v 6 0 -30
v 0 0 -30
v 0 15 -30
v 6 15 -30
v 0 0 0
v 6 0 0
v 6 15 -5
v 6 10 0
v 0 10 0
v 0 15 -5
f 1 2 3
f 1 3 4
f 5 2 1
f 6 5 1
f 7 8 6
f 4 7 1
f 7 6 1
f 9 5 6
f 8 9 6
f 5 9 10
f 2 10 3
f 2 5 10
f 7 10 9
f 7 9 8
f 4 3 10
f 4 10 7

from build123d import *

# Parameters (mm, degrees)
SKETCH_1_W      = 6
SKETCH_1_H      = 30
EXTRUDE_1_DEPTH = 15
CHAMFER_1_SIZE  = 5


with BuildPart() as part:
    # Эскиз1 → Бобышка-Вытянуть1 (new body)
    with BuildSketch(Plane(origin=(0, 0, 0), x_dir=(1, 0, 0), z_dir=(0, 1, 0))):
        with Locations((3, 15)):
            Rectangle(SKETCH_1_W, SKETCH_1_H)
    extrude(amount=EXTRUDE_1_DEPTH)

    # Фаска1
    chamfer_1_edges = [part.edges().sort_by_distance(p)[0] for p in [
        (3, 15, 0),
    ]]
    chamfer(chamfer_1_edges, length=CHAMFER_1_SIZE)


solid = part.part
